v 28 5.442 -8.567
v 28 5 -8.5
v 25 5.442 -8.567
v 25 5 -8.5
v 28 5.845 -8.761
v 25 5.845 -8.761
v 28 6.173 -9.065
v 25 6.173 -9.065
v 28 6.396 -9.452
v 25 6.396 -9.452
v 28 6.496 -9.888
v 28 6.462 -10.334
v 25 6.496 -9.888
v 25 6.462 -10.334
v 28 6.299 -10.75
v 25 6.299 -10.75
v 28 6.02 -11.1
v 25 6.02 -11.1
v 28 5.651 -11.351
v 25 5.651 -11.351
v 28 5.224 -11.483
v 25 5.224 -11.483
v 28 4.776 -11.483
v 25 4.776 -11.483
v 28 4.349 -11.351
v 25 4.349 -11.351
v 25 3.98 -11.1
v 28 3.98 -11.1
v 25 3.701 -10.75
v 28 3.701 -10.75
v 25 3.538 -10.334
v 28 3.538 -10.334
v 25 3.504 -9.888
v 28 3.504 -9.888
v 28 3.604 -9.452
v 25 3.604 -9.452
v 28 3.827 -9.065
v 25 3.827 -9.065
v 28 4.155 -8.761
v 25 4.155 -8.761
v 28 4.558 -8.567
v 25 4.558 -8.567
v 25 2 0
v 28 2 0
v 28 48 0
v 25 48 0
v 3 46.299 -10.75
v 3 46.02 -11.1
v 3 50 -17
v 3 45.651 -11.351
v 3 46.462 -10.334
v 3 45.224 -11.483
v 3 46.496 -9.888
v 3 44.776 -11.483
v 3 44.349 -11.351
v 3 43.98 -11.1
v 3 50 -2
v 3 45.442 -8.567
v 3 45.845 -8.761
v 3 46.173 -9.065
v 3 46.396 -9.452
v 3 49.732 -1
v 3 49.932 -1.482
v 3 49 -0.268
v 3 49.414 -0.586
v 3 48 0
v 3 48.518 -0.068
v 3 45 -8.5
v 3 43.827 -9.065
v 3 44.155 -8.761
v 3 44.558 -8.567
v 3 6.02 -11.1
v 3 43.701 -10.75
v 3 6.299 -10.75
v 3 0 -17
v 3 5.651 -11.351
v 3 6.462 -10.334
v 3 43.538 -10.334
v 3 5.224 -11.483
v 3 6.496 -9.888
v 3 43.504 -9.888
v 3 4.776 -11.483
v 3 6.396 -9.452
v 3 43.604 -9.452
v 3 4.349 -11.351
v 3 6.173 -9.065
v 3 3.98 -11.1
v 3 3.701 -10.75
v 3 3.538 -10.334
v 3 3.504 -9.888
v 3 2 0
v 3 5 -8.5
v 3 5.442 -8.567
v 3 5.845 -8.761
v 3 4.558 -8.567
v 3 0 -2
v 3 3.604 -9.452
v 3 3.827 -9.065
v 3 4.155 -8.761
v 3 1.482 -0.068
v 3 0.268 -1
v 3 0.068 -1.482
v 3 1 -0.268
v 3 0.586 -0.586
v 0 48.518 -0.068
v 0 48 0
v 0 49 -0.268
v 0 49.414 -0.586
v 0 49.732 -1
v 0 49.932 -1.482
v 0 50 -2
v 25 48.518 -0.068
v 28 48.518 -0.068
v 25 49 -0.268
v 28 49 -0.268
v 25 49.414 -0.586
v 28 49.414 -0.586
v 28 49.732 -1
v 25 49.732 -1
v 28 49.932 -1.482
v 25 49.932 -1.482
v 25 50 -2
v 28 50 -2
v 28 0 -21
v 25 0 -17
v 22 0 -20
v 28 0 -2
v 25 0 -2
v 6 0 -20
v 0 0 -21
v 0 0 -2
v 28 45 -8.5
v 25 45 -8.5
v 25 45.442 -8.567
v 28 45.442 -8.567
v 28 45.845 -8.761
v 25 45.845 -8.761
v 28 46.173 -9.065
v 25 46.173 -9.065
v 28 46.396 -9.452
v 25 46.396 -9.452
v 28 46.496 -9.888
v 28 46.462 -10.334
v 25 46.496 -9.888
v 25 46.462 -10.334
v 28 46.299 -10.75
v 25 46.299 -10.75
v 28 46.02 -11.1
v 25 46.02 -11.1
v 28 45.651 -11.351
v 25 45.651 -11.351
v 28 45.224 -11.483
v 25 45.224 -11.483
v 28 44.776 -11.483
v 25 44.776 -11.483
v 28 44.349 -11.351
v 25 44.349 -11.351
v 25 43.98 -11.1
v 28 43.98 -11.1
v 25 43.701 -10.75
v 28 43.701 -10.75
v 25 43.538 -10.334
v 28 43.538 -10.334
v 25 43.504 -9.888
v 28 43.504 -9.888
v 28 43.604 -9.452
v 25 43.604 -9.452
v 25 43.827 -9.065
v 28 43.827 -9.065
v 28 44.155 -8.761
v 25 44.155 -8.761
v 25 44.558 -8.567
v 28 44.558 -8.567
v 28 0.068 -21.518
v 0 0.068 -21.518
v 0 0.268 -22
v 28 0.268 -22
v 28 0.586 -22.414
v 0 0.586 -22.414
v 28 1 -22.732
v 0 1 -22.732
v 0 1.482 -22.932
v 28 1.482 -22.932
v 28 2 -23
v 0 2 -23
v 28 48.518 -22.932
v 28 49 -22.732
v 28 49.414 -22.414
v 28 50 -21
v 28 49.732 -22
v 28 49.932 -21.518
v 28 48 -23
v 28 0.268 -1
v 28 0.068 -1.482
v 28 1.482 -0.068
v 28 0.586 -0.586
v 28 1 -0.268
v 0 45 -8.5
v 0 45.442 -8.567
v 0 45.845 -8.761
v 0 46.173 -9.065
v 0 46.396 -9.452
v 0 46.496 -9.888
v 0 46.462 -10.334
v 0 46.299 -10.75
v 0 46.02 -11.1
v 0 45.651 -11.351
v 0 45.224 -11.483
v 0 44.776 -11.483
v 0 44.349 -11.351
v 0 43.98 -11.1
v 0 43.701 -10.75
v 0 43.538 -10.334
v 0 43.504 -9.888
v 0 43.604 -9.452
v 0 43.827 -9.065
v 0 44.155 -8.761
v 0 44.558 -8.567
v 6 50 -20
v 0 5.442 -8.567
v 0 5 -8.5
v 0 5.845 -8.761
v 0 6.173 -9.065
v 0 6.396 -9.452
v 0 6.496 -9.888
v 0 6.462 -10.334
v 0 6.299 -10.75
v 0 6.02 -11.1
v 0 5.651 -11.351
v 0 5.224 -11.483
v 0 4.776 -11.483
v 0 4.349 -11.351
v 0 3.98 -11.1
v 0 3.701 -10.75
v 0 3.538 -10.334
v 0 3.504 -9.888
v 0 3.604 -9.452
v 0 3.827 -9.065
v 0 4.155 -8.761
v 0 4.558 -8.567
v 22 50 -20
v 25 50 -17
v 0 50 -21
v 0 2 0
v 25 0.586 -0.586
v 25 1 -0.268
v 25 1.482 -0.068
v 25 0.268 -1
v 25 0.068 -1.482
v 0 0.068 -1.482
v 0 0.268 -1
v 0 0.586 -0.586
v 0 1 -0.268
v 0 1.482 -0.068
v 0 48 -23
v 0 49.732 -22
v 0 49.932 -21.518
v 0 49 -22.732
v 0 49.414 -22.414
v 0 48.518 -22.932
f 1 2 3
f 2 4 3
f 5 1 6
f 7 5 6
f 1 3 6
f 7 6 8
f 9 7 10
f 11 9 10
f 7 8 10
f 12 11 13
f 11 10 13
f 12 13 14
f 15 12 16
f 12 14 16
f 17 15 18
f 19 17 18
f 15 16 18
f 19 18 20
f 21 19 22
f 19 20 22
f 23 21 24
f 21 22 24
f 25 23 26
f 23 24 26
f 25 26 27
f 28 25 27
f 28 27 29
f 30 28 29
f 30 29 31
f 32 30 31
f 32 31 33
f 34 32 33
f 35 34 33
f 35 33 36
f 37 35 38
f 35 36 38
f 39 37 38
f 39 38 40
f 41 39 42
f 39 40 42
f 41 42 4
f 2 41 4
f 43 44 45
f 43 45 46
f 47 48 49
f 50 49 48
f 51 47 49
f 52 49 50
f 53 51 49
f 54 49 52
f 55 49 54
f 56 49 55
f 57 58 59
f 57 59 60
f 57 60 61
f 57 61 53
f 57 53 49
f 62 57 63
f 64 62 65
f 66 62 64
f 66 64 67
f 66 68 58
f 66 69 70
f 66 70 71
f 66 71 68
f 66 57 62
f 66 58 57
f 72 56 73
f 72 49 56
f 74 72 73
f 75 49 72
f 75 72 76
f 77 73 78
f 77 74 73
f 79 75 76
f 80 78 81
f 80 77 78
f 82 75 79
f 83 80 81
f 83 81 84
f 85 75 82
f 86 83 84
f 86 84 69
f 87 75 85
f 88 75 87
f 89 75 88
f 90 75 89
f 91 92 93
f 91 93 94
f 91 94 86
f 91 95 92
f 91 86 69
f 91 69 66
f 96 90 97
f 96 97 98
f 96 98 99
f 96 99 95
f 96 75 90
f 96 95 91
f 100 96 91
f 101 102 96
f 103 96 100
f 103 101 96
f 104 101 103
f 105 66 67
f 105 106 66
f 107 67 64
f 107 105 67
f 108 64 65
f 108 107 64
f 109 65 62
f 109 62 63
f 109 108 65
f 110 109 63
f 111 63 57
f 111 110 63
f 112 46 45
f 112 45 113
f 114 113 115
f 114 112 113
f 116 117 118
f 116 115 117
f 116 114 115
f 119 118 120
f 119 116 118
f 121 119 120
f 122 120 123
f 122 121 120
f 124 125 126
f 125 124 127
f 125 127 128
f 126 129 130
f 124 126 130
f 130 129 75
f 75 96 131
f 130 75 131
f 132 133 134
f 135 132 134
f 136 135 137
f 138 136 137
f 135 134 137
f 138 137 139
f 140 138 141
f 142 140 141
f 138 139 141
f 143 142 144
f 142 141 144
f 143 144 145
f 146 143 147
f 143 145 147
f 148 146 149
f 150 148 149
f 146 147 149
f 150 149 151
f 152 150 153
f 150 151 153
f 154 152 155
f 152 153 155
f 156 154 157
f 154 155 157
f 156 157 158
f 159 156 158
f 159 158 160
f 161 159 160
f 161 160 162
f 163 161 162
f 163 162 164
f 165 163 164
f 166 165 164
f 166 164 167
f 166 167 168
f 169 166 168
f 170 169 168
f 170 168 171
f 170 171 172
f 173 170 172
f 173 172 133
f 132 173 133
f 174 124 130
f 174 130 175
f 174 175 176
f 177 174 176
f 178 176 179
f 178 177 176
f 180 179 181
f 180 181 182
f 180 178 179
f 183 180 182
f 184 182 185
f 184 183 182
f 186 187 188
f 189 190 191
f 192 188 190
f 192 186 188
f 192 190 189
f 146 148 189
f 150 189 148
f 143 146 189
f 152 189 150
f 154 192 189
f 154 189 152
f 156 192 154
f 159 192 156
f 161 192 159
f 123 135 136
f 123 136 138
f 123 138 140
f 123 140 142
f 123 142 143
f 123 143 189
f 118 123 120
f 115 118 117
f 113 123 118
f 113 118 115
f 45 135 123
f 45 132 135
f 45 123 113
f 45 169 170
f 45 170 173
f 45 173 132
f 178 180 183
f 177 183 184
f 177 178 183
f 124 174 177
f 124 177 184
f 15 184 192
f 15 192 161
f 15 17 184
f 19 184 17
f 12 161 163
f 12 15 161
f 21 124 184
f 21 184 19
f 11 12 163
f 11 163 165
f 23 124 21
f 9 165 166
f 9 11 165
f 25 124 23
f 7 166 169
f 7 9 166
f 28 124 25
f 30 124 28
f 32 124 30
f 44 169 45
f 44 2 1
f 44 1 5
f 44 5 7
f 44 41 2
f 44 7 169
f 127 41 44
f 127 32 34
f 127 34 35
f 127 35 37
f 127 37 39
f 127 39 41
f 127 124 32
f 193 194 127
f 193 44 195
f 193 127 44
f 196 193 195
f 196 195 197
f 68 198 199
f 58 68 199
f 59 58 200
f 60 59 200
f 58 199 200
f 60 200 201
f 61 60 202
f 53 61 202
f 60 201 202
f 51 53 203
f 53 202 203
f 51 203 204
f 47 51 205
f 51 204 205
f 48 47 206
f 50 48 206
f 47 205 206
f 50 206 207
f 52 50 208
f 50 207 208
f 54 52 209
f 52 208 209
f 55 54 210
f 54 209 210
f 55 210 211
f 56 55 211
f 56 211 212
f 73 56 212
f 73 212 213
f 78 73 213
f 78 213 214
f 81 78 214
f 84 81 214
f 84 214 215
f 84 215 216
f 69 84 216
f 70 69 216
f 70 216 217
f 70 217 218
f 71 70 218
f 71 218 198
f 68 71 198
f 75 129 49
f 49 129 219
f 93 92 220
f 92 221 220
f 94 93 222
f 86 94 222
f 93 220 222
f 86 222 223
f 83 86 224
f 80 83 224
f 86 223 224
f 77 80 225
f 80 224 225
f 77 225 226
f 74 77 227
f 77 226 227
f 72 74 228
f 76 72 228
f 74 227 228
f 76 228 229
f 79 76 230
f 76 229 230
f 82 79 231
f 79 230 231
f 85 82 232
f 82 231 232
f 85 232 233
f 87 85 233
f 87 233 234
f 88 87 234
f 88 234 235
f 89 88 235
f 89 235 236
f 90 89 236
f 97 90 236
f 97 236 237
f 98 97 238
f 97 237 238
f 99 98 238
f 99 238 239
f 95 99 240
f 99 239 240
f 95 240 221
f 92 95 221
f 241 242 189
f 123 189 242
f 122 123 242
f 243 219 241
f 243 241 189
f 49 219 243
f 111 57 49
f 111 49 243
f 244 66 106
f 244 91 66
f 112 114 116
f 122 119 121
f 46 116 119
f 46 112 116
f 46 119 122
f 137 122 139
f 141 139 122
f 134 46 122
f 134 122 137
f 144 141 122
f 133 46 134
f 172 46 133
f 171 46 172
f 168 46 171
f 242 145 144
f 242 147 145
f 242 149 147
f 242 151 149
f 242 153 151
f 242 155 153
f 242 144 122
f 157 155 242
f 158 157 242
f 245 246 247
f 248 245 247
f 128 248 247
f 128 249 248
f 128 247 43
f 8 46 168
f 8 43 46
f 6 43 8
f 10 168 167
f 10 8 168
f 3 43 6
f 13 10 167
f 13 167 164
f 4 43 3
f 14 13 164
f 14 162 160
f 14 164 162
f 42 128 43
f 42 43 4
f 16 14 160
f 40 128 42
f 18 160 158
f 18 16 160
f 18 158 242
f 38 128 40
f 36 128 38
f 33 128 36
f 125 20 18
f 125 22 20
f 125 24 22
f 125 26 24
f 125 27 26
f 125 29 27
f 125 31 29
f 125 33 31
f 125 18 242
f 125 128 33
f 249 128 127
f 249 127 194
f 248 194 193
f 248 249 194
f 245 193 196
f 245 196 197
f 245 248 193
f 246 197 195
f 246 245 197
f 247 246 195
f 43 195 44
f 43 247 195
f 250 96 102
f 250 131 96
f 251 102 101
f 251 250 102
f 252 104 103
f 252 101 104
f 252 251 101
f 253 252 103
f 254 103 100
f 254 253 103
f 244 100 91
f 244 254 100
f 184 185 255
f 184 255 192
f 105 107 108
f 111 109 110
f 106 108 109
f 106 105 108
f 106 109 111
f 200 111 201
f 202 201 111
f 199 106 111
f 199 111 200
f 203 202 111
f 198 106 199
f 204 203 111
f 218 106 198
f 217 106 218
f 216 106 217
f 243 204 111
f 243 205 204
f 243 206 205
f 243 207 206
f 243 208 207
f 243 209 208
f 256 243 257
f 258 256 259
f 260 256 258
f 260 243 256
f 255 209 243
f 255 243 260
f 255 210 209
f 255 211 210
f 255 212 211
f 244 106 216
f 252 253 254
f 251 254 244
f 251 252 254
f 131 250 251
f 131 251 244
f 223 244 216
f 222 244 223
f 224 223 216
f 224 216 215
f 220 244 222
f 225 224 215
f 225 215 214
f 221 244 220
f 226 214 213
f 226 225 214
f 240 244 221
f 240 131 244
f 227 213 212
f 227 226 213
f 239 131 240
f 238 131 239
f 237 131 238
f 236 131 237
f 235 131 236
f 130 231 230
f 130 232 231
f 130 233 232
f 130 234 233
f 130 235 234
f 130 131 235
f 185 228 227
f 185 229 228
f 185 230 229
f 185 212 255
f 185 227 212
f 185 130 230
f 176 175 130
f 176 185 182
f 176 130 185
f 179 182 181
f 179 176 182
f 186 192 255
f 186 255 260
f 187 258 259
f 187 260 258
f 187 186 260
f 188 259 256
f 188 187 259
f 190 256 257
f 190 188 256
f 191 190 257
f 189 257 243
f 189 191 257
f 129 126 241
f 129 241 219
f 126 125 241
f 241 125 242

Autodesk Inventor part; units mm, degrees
ref_plane "YZ Plane" through (0, 0, 0) normal (1, 0, 0) x (0, 1, 0)
ref_plane "XZ Plane" through (0, 0, 0) normal (0, 1, 0) x (-1, 0, 0)
ref_plane "XY Plane" through (0, 0, 0) normal (0, 0, 1) x (1, 0, 0)
sketch "Sketch1" plane through (0, 0, 0) normal (0, 1, 0) x (-1, 0, 0)
  line L0 (0, 0) -> (0, -23)
  line L1 (0, -23) -> (-28, -23)
  line L2 (-28, -23) -> (-28, 0)
  line L3 (-28, 0) -> (-25, 0)
  line L4 (-25, 0) -> (-25, -20)
  line L5 (-25, -20) -> (-3, -20)
  line L6 (-3, -20) -> (-3, 0)
  line L7 (-3, 0) -> (0, 0)
  dimension "d0" = 3
  dimension "d1" = 3
  dimension "d2" = 3
  dimension "d3" = 28
  dimension "d4" = 23
extrude "Extrusion1" add sketch "Sketch1" along normal blind 50
sketch "Sketch2" plane through (0, 0, -23) normal (-1, 0, 0) x (0, 0, 1)
  circle A0 centre (13, 45) radius 1.5
  circle A1 centre (13, 5) radius 1.5
  line L0 (23, 0) -> (23, 50) construction
  line L1 (13, 5) -> (13, 45) construction
  line L2 (0, 0) -> (23, 0) construction
  dimension "d8" = 3
  dimension "d9" = 10
  dimension "d11" = 40
  dimension "d12" = 5
extrude "Extrusion2" cut sketch "Sketch2" against normal up to surface (28 mm away)
fillet "Fillet1" radius 2 6 edges at (1.5, 50, 0) (1.5, 0, 0) (26.5, 50, 0) (26.5, 0, 0) (14, 50, -23) (14, 0, -23)
chamfer "Chamfer1" distance 3 angle 45 2 edges at (3, 25, -20) (25, 25, -20)
properties part number "Front_Wheel_Stand"
